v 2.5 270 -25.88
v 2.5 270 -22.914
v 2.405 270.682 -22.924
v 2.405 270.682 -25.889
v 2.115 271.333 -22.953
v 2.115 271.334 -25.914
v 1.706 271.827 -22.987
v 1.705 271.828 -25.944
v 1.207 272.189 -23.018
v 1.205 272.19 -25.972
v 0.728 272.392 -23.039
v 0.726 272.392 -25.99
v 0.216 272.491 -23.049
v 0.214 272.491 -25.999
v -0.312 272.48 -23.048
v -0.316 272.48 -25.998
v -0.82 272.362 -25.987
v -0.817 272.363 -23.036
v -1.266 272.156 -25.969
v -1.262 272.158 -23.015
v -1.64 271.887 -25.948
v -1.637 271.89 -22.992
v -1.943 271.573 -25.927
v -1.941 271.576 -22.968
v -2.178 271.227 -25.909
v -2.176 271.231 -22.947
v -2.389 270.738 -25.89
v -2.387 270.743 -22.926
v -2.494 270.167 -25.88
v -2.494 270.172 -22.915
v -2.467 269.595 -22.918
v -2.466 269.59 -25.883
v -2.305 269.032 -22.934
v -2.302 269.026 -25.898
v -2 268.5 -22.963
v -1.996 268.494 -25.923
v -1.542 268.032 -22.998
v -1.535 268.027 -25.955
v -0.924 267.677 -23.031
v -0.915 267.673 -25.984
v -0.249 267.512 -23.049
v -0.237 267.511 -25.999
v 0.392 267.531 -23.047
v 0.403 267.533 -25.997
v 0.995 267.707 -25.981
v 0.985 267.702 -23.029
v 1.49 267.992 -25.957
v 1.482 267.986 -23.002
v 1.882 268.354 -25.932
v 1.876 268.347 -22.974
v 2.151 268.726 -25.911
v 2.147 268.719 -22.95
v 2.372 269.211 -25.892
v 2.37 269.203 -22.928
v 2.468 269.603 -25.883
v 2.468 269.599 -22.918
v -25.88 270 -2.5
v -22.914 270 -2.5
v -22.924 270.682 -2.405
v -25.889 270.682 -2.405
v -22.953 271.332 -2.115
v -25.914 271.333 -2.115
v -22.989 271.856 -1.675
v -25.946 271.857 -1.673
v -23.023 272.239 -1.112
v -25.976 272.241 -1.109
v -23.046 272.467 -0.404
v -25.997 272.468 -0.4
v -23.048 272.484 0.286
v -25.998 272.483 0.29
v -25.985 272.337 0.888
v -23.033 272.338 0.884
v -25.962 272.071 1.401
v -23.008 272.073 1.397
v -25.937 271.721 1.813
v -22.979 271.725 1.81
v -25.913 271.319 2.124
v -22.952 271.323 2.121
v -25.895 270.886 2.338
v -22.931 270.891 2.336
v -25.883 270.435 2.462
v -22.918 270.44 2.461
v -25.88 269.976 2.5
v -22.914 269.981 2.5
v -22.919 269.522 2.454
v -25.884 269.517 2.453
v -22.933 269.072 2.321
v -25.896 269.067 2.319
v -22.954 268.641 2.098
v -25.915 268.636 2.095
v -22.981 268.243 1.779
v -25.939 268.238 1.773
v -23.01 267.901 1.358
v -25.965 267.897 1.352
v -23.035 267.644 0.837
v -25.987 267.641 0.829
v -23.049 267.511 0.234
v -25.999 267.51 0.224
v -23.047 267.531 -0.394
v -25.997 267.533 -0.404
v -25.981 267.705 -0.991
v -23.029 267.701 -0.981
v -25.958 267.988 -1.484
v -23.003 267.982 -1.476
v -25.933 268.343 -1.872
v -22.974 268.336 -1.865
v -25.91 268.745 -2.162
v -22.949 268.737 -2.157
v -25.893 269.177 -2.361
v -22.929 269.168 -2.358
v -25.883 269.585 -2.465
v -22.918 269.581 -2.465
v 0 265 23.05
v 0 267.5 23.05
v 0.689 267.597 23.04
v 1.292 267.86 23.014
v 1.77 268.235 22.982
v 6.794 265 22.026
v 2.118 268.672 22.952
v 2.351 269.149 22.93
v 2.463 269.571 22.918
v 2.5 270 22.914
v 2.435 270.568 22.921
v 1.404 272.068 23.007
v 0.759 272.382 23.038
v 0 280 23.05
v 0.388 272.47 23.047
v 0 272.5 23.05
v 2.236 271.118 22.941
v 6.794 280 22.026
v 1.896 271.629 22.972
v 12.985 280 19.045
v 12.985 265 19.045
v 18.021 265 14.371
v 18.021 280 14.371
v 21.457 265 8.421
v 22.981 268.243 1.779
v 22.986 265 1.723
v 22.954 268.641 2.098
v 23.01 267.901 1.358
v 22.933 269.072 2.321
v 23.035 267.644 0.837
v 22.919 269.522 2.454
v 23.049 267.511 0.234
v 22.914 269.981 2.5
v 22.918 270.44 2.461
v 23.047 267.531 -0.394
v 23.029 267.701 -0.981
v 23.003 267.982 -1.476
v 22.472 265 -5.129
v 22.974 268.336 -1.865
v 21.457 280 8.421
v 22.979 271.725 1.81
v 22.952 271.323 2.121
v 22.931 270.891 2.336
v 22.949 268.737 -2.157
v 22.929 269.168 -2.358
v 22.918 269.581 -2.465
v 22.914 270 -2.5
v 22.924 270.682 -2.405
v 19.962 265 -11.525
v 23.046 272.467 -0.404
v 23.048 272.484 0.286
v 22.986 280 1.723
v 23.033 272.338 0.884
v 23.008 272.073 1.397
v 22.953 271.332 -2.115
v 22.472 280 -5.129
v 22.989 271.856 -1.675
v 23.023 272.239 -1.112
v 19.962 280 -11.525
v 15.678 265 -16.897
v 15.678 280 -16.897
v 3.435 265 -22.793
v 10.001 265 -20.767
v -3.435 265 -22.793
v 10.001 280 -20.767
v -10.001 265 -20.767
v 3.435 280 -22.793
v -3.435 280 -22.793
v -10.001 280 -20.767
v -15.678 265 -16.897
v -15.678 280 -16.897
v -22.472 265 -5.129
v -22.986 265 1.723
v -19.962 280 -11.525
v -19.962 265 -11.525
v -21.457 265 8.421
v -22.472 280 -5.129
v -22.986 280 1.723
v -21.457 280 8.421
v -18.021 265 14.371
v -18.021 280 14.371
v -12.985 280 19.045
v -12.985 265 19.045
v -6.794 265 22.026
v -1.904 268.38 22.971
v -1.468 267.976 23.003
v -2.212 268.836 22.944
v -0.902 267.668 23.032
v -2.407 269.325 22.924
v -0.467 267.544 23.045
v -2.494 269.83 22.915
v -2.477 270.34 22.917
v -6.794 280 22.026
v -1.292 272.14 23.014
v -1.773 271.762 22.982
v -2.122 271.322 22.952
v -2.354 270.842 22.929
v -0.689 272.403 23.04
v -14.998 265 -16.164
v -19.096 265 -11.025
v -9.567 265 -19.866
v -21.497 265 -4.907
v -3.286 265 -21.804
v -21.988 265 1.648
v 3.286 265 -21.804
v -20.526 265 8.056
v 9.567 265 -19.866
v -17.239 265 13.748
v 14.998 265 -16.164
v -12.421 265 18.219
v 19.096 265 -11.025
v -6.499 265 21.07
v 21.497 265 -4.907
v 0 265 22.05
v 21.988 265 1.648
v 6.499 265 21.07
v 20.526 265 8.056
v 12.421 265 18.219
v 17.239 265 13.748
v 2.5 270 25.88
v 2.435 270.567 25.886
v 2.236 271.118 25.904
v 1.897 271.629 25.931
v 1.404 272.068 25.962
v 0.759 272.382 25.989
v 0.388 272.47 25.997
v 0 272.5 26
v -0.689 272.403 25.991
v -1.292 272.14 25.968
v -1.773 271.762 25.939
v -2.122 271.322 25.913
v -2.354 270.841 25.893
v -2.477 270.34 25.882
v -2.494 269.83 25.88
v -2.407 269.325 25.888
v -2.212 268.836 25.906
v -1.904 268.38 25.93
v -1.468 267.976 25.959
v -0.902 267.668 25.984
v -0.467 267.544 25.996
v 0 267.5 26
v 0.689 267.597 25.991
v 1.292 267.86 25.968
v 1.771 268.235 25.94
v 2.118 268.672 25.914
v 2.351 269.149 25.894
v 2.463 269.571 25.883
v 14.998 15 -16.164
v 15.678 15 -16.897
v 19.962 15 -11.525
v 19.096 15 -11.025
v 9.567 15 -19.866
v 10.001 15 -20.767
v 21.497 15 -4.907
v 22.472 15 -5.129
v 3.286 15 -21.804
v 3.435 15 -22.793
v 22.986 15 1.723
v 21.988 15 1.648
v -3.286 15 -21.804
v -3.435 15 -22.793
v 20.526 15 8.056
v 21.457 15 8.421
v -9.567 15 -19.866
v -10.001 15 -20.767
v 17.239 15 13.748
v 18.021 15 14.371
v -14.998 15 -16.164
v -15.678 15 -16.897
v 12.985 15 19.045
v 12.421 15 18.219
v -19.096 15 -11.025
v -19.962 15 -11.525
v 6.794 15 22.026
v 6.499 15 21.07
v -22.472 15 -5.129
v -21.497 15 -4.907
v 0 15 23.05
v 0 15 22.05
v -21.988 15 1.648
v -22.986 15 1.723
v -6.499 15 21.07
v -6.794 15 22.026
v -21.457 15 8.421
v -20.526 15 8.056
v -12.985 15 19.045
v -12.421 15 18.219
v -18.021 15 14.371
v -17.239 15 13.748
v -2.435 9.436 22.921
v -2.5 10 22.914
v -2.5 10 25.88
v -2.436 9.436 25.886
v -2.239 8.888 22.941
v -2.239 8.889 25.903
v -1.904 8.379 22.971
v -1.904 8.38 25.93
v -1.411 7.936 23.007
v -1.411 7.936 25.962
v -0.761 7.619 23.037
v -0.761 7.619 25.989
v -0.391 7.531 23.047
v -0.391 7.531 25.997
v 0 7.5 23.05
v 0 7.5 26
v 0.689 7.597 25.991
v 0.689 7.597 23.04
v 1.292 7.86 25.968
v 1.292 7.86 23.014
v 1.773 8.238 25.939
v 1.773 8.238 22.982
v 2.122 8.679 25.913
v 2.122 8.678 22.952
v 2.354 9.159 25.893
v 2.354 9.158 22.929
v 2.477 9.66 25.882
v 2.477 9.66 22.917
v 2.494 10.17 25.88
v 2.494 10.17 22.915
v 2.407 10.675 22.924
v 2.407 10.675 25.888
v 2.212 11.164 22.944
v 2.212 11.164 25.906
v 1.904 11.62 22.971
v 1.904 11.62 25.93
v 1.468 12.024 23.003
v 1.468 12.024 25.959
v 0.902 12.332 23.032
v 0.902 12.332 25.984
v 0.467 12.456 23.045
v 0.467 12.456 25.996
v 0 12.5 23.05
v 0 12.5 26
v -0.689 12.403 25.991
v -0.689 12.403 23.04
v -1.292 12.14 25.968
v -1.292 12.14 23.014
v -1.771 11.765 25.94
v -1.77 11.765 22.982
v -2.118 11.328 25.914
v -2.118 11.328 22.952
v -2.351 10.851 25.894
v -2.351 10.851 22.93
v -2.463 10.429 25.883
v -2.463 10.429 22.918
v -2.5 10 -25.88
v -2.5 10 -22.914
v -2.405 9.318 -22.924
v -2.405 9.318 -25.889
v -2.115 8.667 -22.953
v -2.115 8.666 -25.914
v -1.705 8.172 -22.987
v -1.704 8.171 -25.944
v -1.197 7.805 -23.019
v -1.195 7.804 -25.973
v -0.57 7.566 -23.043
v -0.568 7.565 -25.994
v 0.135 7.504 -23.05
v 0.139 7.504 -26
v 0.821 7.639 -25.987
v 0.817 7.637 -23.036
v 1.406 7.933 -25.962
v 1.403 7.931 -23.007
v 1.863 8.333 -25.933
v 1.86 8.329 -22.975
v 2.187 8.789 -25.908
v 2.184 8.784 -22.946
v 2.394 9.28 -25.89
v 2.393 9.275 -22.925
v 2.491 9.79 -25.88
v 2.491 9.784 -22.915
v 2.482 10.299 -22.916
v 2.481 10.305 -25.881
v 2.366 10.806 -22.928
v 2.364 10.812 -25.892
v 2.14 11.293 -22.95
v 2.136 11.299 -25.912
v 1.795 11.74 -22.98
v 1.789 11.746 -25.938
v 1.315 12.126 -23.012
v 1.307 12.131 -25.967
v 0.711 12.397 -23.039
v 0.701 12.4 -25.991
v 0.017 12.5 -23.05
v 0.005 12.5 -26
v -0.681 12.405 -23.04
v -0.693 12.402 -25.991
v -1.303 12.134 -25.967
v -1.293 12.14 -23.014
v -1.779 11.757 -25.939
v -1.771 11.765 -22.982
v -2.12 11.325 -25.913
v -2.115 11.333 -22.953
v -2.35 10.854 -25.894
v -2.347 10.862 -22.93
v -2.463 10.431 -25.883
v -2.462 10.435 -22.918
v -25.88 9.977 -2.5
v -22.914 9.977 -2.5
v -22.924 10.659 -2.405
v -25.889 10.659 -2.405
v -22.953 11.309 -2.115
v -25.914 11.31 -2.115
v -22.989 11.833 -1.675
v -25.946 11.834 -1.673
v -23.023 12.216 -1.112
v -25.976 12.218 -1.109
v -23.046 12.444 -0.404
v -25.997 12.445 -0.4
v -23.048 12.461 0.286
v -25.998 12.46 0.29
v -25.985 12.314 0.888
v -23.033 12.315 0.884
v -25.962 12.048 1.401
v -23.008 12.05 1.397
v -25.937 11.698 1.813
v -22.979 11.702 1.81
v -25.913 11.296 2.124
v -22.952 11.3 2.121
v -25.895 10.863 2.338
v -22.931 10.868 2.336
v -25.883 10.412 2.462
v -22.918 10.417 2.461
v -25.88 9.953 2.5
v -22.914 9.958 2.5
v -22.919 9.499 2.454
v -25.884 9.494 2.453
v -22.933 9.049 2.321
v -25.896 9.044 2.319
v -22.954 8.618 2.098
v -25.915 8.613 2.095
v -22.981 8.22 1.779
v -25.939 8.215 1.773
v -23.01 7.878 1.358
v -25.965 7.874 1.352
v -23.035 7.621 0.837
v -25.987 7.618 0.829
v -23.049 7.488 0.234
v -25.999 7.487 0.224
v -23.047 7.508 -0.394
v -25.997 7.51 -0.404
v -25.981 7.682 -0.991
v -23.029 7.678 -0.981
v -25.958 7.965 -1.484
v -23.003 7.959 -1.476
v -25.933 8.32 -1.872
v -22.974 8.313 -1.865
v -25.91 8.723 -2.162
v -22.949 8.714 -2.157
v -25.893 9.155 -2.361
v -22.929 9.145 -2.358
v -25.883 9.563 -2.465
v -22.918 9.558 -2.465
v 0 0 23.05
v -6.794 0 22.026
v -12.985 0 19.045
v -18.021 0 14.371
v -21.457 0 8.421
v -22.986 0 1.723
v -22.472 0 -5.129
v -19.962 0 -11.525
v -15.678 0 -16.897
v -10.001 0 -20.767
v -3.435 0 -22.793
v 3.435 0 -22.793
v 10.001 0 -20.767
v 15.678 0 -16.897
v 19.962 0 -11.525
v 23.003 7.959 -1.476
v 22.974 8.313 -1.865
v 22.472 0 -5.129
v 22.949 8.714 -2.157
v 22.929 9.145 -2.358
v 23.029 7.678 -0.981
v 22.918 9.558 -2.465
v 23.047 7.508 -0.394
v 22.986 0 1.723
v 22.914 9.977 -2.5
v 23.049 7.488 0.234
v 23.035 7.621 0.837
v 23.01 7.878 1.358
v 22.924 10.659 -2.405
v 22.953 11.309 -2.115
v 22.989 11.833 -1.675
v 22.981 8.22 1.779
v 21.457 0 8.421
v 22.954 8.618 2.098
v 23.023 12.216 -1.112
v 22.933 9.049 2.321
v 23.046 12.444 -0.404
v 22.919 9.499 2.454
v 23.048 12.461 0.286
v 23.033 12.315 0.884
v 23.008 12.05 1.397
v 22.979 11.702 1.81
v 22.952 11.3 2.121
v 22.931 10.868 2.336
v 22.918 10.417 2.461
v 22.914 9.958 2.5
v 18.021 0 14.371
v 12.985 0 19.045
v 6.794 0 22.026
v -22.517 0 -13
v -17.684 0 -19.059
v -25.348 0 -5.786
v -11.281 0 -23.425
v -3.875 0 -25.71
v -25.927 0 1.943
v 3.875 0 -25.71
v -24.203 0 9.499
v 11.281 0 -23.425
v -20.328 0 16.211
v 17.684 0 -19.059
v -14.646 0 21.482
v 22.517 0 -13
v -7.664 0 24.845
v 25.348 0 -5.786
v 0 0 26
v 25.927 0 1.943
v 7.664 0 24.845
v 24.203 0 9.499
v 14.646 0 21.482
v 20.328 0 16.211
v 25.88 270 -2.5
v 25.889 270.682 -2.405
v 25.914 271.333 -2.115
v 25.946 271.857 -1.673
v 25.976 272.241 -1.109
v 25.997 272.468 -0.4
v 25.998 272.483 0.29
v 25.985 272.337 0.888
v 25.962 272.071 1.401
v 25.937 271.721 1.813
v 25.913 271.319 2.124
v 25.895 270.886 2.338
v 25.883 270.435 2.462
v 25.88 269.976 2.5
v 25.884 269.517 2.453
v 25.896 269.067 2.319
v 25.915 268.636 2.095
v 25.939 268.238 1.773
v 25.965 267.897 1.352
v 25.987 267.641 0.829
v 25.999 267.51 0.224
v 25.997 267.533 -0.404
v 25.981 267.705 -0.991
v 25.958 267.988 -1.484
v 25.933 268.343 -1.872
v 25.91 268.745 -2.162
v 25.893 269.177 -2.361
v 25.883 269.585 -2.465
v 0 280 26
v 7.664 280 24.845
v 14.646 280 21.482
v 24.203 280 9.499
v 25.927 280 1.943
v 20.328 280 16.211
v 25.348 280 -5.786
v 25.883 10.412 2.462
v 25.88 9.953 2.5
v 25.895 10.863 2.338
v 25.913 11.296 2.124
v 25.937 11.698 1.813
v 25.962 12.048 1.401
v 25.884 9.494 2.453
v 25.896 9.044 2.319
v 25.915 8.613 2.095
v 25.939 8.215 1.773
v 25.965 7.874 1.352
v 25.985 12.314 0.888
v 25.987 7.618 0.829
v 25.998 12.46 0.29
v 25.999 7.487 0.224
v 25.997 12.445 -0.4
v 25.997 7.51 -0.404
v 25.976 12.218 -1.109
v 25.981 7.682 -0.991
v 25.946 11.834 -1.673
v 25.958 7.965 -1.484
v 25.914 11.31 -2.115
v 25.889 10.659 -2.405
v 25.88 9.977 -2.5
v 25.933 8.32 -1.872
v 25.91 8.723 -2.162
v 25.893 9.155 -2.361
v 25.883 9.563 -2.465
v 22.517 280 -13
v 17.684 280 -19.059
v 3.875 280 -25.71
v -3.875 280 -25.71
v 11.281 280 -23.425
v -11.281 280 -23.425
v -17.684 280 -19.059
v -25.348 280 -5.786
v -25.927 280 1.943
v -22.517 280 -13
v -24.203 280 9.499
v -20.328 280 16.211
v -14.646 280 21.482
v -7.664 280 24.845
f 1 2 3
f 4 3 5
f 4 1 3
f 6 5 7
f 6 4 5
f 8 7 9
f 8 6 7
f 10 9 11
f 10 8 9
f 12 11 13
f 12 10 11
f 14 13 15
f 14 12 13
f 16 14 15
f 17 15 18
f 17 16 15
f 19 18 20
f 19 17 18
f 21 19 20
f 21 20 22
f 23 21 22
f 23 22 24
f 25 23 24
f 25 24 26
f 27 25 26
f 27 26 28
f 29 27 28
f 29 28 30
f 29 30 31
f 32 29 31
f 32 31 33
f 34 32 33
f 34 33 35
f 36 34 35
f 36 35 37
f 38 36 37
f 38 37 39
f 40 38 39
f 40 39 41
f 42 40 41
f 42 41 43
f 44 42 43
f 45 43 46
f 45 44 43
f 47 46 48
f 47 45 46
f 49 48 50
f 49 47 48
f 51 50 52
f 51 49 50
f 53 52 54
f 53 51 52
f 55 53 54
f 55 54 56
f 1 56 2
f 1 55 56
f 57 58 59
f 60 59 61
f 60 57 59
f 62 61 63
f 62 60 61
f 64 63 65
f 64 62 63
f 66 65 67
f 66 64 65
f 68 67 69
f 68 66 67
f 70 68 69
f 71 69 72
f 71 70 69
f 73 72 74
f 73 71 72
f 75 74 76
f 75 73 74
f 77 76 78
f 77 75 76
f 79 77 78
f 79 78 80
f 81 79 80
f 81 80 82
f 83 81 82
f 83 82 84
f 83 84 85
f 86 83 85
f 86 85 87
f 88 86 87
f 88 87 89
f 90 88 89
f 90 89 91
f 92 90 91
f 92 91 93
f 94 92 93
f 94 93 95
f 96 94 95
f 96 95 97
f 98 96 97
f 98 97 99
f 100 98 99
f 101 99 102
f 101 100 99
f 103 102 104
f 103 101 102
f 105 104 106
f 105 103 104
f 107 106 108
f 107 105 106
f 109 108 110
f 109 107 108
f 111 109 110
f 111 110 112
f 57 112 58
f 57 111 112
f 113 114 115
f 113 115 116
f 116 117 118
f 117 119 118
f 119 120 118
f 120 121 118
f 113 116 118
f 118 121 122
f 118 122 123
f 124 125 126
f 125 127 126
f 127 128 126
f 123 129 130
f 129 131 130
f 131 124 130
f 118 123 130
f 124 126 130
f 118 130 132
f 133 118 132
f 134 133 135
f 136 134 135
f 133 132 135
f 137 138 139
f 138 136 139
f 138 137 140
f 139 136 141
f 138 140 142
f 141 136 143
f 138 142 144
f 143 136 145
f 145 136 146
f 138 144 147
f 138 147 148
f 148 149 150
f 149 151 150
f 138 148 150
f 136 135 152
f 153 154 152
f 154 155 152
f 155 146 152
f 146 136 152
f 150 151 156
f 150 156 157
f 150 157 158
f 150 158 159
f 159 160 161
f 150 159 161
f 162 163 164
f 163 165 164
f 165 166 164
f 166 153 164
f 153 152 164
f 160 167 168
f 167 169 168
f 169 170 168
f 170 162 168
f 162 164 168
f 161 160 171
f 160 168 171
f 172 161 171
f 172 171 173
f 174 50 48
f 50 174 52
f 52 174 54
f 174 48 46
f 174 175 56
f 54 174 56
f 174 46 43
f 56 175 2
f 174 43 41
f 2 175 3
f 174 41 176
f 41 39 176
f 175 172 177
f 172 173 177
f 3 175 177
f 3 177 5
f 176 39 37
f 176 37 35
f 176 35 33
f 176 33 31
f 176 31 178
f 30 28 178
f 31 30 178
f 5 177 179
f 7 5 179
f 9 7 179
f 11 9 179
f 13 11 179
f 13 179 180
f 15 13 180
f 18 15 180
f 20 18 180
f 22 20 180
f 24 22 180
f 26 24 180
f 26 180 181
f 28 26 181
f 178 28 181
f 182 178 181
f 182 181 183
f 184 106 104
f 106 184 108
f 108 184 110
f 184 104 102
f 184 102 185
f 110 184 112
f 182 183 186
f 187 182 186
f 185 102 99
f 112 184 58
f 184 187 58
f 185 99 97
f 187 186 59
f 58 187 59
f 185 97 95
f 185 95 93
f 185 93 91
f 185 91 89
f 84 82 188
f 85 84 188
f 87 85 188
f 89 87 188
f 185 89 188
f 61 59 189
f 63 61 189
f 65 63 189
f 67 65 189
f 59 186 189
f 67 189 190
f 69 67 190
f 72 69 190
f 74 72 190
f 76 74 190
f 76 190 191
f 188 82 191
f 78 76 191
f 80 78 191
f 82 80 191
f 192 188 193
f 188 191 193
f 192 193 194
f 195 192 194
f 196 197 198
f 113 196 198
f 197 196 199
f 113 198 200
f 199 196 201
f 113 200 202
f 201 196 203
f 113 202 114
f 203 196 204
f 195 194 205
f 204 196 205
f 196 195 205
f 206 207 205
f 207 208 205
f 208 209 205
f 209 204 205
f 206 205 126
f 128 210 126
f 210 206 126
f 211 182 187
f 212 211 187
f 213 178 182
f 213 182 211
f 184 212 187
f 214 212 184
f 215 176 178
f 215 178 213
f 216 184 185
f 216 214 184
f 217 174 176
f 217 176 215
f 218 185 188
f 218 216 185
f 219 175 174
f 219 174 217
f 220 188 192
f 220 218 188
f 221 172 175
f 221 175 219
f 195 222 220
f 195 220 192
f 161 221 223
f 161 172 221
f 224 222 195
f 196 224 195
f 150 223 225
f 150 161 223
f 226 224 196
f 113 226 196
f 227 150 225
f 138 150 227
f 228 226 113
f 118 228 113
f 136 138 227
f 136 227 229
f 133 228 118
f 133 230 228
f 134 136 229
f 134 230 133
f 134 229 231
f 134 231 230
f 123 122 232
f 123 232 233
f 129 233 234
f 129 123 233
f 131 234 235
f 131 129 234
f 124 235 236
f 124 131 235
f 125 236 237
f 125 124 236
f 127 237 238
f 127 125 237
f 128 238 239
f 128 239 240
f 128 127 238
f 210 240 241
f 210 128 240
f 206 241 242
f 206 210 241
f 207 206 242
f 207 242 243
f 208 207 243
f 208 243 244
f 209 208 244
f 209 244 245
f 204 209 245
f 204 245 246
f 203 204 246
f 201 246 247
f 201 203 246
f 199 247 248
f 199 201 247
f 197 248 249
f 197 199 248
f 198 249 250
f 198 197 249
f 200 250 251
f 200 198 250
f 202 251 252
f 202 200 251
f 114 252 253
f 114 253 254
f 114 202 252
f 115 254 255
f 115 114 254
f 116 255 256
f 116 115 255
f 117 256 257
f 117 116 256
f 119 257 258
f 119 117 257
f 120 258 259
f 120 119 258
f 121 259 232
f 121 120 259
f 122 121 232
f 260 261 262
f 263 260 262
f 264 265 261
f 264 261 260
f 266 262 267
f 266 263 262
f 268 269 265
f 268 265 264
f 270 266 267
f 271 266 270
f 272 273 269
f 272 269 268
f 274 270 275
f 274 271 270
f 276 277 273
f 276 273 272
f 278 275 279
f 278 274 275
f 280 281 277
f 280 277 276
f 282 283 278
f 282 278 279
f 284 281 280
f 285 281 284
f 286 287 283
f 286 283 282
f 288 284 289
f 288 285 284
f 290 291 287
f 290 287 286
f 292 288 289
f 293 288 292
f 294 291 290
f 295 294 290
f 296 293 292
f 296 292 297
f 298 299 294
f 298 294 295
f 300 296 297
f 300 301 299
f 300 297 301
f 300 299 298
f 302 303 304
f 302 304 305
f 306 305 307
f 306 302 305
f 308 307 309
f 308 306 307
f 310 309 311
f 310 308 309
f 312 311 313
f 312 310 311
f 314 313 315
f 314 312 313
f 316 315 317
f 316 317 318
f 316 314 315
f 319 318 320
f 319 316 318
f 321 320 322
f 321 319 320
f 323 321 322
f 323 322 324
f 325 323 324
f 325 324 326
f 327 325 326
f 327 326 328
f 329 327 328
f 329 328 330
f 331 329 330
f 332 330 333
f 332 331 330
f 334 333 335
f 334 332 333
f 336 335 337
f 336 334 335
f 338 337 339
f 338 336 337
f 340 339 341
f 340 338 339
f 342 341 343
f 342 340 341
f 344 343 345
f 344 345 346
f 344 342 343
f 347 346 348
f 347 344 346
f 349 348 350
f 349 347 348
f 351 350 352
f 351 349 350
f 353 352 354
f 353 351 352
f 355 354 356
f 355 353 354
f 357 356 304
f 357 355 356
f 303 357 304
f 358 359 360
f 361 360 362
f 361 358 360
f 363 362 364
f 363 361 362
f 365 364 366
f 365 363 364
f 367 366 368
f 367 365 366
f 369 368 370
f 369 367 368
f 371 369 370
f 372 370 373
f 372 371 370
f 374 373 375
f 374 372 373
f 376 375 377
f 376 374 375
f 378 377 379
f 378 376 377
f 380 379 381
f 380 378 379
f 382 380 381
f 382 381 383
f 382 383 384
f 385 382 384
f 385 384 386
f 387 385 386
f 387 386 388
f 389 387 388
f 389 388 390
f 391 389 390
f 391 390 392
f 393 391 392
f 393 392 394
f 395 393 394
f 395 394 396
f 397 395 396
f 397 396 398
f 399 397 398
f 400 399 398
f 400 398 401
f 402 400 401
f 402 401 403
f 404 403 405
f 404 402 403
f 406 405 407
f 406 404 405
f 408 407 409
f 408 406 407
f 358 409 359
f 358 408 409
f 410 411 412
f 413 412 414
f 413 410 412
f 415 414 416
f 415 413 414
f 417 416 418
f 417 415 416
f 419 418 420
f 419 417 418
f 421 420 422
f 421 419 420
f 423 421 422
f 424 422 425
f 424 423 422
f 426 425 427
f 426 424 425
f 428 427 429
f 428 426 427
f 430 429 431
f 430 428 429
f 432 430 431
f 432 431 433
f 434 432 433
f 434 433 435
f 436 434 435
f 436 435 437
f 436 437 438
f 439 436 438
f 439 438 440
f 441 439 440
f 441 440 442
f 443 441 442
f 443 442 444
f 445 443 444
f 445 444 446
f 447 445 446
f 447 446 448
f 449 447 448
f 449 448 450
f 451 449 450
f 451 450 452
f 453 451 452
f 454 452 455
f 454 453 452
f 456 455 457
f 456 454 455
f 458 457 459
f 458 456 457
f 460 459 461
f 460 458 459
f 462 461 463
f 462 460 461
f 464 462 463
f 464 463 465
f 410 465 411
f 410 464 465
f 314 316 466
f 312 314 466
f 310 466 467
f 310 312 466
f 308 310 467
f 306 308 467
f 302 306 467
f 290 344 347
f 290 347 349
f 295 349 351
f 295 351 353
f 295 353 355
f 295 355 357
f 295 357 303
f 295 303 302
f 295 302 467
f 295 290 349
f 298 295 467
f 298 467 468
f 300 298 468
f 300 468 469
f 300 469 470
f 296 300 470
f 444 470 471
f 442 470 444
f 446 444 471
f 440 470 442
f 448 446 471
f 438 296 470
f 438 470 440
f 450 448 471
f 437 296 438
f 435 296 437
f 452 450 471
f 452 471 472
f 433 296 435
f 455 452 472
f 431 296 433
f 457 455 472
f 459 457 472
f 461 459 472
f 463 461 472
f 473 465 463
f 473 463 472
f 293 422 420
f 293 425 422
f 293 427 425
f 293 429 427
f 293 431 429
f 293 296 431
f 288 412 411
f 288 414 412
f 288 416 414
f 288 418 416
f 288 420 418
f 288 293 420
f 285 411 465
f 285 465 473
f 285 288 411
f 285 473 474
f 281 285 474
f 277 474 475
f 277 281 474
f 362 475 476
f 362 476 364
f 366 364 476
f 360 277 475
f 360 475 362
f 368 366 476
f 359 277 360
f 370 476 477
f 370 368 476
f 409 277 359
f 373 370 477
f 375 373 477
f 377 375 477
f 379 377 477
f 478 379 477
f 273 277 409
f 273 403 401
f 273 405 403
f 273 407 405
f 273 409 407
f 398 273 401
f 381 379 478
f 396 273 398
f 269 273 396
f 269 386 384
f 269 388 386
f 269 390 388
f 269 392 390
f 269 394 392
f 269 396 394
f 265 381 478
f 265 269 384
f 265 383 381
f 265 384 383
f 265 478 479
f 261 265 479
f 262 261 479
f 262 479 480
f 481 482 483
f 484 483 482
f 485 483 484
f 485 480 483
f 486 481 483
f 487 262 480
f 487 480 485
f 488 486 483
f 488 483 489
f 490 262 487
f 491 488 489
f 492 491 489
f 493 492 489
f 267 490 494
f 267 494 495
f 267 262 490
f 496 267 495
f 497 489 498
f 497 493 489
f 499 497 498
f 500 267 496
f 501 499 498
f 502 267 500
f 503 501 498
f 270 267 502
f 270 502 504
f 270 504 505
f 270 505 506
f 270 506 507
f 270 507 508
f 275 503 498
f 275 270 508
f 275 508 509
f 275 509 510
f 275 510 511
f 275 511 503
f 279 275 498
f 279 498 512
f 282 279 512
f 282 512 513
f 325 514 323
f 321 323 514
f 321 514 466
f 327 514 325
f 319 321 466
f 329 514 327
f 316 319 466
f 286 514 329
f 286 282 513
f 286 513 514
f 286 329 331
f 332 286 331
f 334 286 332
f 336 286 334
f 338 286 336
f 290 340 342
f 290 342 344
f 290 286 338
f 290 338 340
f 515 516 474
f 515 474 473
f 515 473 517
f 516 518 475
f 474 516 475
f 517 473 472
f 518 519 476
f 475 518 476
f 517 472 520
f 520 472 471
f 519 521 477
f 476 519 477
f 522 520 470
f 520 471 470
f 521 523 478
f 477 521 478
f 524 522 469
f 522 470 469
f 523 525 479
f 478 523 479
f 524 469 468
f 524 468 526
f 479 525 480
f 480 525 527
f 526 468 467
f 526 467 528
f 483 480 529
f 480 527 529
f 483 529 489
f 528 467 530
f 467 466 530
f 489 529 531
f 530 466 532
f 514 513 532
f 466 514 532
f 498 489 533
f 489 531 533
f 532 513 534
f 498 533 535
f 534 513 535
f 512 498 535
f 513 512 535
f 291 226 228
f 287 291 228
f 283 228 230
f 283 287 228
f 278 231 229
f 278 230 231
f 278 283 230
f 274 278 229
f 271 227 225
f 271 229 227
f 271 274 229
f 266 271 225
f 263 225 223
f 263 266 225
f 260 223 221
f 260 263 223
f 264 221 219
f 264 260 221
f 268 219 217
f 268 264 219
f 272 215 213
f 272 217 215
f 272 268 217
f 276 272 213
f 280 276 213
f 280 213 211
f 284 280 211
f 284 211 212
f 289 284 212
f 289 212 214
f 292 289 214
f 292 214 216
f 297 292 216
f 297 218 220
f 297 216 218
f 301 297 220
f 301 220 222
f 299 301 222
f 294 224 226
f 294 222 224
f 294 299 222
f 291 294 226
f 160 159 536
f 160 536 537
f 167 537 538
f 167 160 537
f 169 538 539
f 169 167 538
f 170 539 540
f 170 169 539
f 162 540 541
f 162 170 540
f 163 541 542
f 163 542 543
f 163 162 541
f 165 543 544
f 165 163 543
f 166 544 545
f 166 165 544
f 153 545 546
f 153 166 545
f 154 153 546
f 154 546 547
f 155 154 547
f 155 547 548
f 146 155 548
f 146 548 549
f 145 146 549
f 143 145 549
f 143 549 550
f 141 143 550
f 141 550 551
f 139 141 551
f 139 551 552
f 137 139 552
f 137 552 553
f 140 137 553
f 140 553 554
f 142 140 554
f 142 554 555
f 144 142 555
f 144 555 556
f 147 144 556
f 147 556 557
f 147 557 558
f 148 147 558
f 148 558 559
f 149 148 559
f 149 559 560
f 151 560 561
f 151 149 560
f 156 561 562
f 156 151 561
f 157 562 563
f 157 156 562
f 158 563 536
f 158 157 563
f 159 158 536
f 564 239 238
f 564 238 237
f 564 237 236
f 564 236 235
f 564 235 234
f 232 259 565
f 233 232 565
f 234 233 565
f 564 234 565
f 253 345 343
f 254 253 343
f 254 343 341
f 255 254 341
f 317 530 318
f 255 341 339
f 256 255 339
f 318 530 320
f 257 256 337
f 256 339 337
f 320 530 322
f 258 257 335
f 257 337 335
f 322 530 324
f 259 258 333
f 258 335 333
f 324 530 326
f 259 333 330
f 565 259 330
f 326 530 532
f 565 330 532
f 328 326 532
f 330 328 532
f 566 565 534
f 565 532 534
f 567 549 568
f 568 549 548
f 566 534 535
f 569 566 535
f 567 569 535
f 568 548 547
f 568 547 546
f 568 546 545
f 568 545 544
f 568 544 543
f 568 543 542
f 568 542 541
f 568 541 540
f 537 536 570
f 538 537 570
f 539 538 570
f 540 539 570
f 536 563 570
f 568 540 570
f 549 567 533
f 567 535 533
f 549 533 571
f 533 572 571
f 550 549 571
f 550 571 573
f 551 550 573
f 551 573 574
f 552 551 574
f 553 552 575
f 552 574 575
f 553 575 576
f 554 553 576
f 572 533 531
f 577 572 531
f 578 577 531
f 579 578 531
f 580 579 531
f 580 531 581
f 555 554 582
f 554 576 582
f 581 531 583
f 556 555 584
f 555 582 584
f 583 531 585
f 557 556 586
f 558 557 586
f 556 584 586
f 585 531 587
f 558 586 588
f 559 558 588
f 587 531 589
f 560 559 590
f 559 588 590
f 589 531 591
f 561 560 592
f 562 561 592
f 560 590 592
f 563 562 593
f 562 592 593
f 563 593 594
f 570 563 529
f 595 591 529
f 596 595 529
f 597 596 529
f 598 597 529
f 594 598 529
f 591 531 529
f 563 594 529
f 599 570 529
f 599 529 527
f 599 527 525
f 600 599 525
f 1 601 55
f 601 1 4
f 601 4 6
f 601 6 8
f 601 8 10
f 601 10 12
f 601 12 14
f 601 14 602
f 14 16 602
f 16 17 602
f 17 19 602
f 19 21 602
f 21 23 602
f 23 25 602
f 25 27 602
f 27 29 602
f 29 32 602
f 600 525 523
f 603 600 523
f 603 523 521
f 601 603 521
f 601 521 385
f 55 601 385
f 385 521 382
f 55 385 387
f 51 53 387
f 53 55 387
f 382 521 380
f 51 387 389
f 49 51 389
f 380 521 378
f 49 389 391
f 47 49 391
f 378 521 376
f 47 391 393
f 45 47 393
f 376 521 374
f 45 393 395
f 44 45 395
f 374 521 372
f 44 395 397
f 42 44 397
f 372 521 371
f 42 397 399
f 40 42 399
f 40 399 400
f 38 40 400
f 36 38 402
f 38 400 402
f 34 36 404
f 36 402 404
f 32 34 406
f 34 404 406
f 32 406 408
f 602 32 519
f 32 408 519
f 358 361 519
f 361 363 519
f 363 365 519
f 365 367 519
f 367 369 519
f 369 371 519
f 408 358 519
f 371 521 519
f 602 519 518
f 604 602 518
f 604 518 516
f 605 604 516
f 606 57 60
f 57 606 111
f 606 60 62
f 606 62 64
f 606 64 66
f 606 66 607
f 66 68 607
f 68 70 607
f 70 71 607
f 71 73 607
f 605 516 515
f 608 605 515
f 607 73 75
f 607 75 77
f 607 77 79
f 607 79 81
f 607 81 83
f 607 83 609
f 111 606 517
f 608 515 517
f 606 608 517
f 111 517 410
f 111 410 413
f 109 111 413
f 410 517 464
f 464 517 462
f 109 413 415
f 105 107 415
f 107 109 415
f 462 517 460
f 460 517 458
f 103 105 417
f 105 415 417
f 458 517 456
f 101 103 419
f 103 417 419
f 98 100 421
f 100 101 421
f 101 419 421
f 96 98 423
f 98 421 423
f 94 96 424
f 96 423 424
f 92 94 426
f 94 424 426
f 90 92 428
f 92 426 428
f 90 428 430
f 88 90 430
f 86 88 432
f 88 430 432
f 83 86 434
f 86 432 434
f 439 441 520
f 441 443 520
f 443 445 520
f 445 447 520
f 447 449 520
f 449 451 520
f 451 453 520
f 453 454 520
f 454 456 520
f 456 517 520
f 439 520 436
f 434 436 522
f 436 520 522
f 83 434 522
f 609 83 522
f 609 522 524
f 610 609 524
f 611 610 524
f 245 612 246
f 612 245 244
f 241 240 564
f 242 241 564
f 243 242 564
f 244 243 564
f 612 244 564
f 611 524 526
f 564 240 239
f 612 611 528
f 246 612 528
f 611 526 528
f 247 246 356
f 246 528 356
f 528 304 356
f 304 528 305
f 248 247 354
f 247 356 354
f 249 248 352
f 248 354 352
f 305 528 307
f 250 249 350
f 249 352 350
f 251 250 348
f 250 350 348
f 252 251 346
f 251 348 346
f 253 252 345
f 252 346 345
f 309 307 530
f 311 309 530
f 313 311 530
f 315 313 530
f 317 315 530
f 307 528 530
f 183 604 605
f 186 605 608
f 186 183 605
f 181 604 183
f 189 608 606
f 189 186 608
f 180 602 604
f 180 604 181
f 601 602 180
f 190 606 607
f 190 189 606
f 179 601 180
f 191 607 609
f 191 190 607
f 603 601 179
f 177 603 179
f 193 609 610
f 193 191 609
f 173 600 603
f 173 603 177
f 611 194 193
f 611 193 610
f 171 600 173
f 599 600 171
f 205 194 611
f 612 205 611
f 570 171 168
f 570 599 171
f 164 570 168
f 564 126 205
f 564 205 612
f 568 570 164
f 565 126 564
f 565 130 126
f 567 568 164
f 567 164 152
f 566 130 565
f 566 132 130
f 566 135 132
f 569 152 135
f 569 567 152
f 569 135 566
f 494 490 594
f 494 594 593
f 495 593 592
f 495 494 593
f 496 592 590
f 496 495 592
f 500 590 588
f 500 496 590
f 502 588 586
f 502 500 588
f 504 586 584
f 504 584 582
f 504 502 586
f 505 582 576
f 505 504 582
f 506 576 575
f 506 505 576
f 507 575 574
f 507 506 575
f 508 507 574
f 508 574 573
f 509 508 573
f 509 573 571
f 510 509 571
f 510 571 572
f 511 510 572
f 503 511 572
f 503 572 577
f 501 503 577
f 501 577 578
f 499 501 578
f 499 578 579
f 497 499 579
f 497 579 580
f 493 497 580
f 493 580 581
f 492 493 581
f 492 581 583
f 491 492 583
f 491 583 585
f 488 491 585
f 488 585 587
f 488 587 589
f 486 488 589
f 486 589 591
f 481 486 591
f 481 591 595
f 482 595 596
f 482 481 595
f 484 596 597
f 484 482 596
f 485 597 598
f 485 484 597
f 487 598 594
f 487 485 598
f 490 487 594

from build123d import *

# Parameters (mm, degrees)
SKETCH_1_R               = 26
SKETCH_1_R_2             = 22.05
EXTRUDE_1_DEPTH          = 280
SKETCH_5_R               = 23.05
CUT_EXTRUDE_2_DEPTH      = 15
CUT_EXTRUDE_START        = -15
SKETCH_2_R               = 23.05
CUT_EXTRUDE_3_DEPTH      = 15
CUT_EXTRUDE_4_DEPTH      = 46
CUT_EXTRUDE_4_DEPTH_BACK = 47
SKETCH_6_R               = 2.5
CUT_EXTRUDE_5_DEPTH      = 60
CUT_EXTRUDE_5_DEPTH_BACK = 58
SKETCH_8_R               = 2.5
CUT_EXTRUDE_6_DEPTH      = 80
CUT_EXTRUDE_6_DEPTH_BACK = 61
SKETCH_9_R               = 2.5
CUT_EXTRUDE_7_DEPTH      = 102
CUT_EXTRUDE_7_DEPTH_BACK = 81
SKETCH_10_R              = 2.5


with BuildPart() as part:
    # 스케치1 → 보스-돌출1 (new body)
    with BuildSketch(Plane(origin=(0, 0, 0), x_dir=(1, 0, 0), z_dir=(0, 1, 0))):
        with Locations(Location((0, 0, 0), (0, 0, 270))):
            Circle(SKETCH_1_R)
        with Locations(Location((0, 0, 0), (0, 0, 270))):
            Circle(SKETCH_1_R_2, mode=Mode.SUBTRACT)
    extrude(amount=EXTRUDE_1_DEPTH)

    # 스케치5 → 컷-돌출2 (cut)
    with BuildSketch(Plane(origin=(0, 280, 0), x_dir=(1, 0, 0), z_dir=(0, 1, 0))):
        with Locations(Location((0, 0, 0), (0, 0, 270))):
            Circle(SKETCH_5_R)
    extrude(amount=-CUT_EXTRUDE_2_DEPTH, mode=Mode.SUBTRACT)

    # 스케치2 → 컷-돌출3 (cut)
    with BuildSketch(Plane.XZ.offset(CUT_EXTRUDE_START)):
        with Locations(Location((0, 0, 0), (0, 0, 90))):
            Circle(SKETCH_2_R)
    extrude(amount=CUT_EXTRUDE_3_DEPTH, mode=Mode.SUBTRACT)

    # 스케치6 → 컷-돌출4 (cut, two sides: drawn at the far end of the back side and taken through both)
    with BuildSketch(Plane.XY.offset(-CUT_EXTRUDE_4_DEPTH_BACK)):
        with Locations(Location((0, 10, 0), (0, 0, 180))):
            Circle(SKETCH_6_R)
    extrude(amount=CUT_EXTRUDE_4_DEPTH + CUT_EXTRUDE_4_DEPTH_BACK, mode=Mode.SUBTRACT)

    # 스케치8 → 컷-돌출5 (cut, two sides: drawn at the far end of the back side and taken through both)
    with BuildSketch(Plane(origin=(0, 0, 0), x_dir=(0, 0, -1), z_dir=(1, 0, 0)).offset(-CUT_EXTRUDE_5_DEPTH_BACK)):
        with Locations((0, 9.977061327)):
            Circle(SKETCH_8_R)
    extrude(amount=CUT_EXTRUDE_5_DEPTH + CUT_EXTRUDE_5_DEPTH_BACK, mode=Mode.SUBTRACT)

    # 스케치9 → 컷-돌출6 (cut, two sides: drawn at the far end of the back side and taken through both)
    with BuildSketch(Plane.XY.offset(-CUT_EXTRUDE_6_DEPTH_BACK)):
        with Locations((0, 270)):
            Circle(SKETCH_9_R)
    extrude(amount=CUT_EXTRUDE_6_DEPTH + CUT_EXTRUDE_6_DEPTH_BACK, mode=Mode.SUBTRACT)

    # 스케치10 → 컷-돌출7 (cut, two sides: drawn at the far end of the back side and taken through both)
    with BuildSketch(Plane(origin=(0, 0, 0), x_dir=(0, 0, -1), z_dir=(1, 0, 0)).offset(-CUT_EXTRUDE_7_DEPTH_BACK)):
        with Locations((0, 270)):
            Circle(SKETCH_10_R)
    extrude(amount=CUT_EXTRUDE_7_DEPTH + CUT_EXTRUDE_7_DEPTH_BACK, mode=Mode.SUBTRACT)


solid = part.part
